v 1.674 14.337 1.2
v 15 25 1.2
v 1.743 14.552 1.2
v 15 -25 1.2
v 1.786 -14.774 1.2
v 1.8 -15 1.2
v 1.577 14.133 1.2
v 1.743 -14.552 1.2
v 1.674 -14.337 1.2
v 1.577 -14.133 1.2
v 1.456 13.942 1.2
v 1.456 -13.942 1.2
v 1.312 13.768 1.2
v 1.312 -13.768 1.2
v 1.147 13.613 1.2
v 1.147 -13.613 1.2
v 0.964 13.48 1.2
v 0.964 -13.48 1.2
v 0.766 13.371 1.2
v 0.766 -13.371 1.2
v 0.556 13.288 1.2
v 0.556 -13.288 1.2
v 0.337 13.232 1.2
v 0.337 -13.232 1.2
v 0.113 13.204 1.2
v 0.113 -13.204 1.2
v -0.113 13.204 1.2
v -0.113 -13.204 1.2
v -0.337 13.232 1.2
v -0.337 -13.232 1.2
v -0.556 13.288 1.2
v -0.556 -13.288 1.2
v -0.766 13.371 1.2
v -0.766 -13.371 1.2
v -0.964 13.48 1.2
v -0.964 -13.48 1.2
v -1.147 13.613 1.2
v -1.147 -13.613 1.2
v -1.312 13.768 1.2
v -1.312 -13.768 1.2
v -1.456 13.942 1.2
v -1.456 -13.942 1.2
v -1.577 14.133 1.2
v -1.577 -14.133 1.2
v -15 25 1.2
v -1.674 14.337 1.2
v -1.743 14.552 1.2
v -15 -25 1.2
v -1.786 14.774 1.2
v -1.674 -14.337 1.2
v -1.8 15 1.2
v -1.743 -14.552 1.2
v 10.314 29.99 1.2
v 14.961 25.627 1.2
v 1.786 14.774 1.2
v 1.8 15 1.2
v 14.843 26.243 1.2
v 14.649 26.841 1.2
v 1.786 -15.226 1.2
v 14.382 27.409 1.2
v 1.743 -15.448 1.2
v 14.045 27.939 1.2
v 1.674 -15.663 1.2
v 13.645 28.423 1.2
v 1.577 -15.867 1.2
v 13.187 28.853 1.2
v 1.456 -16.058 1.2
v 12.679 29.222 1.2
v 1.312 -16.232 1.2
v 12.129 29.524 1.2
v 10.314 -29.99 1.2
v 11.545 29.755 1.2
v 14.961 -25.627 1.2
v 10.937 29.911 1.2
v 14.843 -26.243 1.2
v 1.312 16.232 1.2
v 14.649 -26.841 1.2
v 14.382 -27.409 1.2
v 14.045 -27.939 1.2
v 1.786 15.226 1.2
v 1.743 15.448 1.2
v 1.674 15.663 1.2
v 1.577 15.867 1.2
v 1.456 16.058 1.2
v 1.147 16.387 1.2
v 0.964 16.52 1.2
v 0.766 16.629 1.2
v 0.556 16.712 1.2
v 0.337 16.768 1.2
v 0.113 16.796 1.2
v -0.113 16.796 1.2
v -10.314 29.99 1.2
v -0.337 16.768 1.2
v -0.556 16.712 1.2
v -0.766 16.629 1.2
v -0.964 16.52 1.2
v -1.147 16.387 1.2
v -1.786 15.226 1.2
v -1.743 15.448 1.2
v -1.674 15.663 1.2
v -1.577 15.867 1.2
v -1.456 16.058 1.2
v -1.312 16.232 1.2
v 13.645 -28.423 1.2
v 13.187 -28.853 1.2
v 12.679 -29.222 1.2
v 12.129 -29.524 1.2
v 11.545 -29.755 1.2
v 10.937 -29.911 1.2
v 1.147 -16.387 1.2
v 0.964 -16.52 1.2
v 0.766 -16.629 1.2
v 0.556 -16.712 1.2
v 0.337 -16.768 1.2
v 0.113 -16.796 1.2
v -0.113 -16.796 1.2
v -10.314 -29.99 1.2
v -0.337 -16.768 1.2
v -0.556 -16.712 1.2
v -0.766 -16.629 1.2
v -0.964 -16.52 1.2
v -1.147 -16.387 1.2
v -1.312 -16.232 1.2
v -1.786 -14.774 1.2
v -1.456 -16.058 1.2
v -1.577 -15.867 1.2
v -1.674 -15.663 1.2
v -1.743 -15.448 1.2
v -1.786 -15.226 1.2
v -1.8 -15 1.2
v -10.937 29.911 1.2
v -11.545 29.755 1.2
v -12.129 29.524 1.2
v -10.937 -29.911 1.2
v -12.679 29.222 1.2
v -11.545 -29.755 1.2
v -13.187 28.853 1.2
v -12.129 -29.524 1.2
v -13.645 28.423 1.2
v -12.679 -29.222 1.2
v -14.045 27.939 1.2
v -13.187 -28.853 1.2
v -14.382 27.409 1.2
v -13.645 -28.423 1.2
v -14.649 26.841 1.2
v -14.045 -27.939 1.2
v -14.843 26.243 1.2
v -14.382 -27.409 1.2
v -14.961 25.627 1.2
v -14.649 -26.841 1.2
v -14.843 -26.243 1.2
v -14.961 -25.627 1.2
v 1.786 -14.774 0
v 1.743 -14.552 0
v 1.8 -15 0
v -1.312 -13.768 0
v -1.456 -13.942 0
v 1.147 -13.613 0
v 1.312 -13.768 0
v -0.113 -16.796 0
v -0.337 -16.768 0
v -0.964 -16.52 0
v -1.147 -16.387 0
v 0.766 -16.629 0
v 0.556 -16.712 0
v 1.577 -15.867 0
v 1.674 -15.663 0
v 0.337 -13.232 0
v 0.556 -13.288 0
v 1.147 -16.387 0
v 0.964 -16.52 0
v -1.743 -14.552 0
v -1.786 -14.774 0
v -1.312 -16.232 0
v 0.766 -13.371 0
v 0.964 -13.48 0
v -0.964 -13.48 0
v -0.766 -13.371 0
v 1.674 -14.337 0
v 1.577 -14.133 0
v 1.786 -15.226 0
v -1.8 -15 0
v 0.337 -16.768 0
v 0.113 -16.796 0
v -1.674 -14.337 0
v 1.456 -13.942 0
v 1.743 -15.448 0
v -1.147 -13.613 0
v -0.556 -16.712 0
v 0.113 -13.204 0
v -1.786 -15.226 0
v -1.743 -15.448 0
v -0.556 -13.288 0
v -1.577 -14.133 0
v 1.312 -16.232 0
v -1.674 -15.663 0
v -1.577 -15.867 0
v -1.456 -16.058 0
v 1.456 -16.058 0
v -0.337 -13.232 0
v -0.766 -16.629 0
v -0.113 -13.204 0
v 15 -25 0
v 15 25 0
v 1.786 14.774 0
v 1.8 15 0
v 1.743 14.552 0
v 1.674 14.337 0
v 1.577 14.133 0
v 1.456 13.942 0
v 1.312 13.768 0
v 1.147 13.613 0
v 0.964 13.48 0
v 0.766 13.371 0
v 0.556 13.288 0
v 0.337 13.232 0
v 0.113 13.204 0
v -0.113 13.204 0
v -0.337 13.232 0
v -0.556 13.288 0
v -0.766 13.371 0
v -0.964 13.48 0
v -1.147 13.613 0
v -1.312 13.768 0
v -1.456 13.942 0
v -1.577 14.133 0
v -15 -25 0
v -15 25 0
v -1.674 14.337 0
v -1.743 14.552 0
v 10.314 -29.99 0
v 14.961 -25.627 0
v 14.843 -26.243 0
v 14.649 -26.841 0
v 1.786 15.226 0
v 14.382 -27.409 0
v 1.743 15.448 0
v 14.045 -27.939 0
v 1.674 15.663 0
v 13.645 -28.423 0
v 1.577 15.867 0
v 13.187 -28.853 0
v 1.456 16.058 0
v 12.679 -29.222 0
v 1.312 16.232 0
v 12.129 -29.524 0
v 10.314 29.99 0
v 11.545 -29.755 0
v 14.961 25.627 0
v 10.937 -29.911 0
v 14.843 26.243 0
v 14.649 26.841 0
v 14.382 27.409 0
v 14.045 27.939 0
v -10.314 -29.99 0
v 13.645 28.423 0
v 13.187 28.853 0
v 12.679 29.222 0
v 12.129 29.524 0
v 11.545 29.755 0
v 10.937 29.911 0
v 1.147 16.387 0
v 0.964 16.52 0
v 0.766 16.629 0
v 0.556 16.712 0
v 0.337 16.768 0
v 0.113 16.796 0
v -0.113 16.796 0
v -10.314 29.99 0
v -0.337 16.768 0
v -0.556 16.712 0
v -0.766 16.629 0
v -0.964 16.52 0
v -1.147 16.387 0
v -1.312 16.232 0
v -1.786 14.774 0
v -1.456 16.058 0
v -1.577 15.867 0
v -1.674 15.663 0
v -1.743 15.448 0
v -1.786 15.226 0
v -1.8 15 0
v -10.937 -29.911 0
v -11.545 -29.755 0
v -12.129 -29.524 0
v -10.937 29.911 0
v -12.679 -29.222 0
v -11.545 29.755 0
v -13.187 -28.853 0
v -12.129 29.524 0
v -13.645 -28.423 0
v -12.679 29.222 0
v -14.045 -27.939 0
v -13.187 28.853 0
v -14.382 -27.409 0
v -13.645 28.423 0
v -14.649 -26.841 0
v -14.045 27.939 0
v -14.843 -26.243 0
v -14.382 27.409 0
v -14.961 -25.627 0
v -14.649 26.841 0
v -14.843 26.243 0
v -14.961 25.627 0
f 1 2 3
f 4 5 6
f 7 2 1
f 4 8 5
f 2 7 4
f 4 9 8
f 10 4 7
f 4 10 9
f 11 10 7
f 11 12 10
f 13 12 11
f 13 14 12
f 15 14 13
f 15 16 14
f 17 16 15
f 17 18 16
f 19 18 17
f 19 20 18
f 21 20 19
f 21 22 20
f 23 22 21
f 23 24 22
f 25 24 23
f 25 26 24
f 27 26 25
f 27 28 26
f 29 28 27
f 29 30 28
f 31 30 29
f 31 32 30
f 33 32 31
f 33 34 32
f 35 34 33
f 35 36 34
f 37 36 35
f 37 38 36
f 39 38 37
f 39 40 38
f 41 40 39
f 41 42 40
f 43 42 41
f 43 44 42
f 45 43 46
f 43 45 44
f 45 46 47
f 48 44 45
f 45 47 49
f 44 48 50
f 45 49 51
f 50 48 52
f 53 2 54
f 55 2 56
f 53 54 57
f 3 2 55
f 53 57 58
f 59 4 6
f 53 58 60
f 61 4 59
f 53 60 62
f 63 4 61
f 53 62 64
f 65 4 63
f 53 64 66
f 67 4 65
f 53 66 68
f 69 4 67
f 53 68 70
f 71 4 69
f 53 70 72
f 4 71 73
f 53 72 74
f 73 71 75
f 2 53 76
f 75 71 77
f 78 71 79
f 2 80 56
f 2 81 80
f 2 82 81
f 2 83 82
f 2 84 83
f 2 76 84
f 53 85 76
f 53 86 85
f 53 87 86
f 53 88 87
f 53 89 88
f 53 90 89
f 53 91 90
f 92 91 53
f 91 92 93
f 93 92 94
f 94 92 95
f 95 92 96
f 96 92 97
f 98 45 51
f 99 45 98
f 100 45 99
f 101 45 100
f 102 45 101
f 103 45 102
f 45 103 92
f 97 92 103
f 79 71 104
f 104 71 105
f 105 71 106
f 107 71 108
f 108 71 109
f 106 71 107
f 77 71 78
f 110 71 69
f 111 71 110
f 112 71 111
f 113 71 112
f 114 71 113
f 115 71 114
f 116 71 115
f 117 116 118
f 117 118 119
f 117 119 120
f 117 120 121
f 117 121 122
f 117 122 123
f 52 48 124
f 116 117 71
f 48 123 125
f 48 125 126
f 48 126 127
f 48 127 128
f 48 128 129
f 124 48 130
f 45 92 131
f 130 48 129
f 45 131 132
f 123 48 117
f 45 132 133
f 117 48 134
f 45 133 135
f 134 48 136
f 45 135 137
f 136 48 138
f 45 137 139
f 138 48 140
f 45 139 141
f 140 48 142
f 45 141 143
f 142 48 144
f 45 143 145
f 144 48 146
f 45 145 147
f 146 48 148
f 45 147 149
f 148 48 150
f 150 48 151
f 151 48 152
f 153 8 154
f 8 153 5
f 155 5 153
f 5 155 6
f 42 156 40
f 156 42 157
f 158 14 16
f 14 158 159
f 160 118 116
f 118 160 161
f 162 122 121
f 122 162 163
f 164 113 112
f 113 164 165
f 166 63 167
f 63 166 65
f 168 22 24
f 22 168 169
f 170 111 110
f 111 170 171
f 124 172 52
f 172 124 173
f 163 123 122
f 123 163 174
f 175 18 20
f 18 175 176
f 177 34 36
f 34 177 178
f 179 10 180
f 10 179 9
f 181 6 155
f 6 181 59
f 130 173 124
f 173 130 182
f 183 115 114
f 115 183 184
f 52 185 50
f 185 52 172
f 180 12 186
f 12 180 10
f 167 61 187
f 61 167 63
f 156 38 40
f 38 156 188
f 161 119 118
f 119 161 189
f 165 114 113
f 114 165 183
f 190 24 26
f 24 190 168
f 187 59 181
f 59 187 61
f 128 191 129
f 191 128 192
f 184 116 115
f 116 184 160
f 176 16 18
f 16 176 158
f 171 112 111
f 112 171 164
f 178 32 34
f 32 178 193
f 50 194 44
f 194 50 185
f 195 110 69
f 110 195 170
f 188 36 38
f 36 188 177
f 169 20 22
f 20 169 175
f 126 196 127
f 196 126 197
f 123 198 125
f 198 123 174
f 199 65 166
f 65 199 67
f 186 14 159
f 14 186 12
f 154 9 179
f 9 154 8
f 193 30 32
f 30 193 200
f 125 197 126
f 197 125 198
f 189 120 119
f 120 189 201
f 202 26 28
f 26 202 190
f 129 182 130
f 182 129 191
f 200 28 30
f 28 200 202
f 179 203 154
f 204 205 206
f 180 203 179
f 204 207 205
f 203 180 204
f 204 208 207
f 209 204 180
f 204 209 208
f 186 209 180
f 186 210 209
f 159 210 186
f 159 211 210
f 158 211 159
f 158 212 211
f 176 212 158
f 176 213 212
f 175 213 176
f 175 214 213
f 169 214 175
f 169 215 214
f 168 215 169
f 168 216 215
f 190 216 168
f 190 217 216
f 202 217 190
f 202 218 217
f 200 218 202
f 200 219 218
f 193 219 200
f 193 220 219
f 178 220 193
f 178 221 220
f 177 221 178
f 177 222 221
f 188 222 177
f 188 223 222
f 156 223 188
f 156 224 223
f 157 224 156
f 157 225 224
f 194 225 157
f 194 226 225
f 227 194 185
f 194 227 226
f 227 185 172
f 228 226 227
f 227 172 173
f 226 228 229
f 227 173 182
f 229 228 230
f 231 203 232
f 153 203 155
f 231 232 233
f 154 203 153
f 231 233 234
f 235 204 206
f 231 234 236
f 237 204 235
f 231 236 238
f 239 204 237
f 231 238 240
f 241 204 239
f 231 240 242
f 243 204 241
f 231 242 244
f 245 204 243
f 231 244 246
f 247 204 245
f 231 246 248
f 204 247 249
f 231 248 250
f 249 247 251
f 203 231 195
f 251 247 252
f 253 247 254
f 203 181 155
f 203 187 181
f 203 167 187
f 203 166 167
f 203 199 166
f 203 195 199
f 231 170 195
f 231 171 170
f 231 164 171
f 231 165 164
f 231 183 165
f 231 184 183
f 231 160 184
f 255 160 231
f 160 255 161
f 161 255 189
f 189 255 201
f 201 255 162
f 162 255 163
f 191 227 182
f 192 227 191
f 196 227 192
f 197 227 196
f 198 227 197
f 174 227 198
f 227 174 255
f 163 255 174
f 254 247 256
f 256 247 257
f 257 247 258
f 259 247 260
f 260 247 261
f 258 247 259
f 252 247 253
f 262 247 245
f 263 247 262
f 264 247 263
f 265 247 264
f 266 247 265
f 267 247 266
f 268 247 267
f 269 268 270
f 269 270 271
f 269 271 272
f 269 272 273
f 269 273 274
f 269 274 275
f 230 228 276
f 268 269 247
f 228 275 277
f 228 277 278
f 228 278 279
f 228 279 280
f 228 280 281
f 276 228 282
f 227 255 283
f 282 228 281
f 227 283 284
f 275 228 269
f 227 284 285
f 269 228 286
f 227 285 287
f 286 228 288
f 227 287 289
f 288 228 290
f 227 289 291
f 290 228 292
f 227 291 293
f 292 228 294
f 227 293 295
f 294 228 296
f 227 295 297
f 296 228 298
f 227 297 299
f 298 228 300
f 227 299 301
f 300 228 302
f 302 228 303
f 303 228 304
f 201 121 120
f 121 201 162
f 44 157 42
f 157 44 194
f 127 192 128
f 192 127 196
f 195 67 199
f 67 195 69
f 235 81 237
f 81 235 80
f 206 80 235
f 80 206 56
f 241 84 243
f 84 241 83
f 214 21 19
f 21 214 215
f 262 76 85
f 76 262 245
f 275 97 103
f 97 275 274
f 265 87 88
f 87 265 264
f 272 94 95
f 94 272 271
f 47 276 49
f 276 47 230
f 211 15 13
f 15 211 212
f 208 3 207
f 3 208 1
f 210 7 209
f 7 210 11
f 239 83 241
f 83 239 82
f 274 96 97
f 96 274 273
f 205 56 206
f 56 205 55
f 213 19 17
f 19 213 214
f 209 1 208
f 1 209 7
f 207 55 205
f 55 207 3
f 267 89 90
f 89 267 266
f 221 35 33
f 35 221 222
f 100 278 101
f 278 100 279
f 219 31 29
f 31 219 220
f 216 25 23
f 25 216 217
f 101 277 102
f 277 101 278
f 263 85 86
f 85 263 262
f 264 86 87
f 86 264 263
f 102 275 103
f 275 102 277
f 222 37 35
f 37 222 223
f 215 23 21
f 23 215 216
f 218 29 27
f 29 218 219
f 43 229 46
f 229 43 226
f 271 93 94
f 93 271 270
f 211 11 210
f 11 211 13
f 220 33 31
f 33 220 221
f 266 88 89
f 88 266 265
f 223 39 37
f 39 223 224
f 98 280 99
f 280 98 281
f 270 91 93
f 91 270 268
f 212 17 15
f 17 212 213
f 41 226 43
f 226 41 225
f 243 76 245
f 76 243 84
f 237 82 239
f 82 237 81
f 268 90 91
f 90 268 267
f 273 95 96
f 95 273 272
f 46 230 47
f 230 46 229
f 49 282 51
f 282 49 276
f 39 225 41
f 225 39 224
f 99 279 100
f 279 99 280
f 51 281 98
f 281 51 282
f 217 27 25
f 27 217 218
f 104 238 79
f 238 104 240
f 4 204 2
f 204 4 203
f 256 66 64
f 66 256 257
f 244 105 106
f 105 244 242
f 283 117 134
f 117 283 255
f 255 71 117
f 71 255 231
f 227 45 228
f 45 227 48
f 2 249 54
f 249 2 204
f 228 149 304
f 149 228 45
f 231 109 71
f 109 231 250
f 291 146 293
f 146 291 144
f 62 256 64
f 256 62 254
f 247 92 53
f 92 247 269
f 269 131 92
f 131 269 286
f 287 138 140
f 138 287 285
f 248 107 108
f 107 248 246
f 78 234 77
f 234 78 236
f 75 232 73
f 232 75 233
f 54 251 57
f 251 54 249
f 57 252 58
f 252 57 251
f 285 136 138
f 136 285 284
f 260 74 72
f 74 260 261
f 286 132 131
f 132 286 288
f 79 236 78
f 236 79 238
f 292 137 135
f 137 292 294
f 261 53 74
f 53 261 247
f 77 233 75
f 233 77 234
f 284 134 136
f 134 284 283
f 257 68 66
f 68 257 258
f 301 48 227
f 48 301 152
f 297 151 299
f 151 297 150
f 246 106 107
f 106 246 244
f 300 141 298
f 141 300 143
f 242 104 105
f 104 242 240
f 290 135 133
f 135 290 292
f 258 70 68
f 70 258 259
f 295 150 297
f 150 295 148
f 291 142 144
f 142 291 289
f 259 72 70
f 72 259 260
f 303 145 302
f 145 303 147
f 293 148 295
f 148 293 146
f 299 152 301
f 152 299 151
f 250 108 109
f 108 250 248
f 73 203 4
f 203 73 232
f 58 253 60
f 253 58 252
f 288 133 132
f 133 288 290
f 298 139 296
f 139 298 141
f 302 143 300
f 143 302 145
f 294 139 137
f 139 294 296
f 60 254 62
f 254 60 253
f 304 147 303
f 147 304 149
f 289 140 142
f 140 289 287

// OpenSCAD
$fn = 50;


difference() {
	union() {
		hull() {
			translate(v = [-10.0000000000, 25.0000000000, 0]) {
				cylinder(h = 90, r = 5);
			}
			translate(v = [10.0000000000, 25.0000000000, 0]) {
				cylinder(h = 90, r = 5);
			}
			translate(v = [-10.0000000000, -25.0000000000, 0]) {
				cylinder(h = 90, r = 5);
			}
			translate(v = [10.0000000000, -25.0000000000, 0]) {
				cylinder(h = 90, r = 5);
			}
		}
	}
	union() {
		translate(v = [0, 0, 1.2000000000]) {
			hull() {
				translate(v = [-10.0000000000, 25.0000000000, 0]) {
					cylinder(h = 88.8000000000, r = 3.8000000000);
				}
				translate(v = [10.0000000000, 25.0000000000, 0]) {
					cylinder(h = 88.8000000000, r = 3.8000000000);
				}
				translate(v = [-10.0000000000, -25.0000000000, 0]) {
					cylinder(h = 88.8000000000, r = 3.8000000000);
				}
				translate(v = [10.0000000000, -25.0000000000, 0]) {
					cylinder(h = 88.8000000000, r = 3.8000000000);
				}
			}
		}
		#translate(v = [0.0000000000, -15.0000000000, 0]) {
			cylinder(h = 1.2000000000, r = 1.8000000000);
		}
		#translate(v = [0.0000000000, 15.0000000000, 0]) {
			cylinder(h = 1.2000000000, r = 1.8000000000);
		}
		translate(v = [-250.0000000000, -250.0000000000, 1.2000000000]) {
			cube(size = [500, 500, 500]);
		}
		translate(v = [-250.0000000000, -250.0000000000, 1.2000000000]) {
			cube(size = [500, 500, 500]);
		}
		translate(v = [-250.0000000000, -250.0000000000, 1.2000000000]) {
			cube(size = [500, 500, 500]);
		}
	}
}
